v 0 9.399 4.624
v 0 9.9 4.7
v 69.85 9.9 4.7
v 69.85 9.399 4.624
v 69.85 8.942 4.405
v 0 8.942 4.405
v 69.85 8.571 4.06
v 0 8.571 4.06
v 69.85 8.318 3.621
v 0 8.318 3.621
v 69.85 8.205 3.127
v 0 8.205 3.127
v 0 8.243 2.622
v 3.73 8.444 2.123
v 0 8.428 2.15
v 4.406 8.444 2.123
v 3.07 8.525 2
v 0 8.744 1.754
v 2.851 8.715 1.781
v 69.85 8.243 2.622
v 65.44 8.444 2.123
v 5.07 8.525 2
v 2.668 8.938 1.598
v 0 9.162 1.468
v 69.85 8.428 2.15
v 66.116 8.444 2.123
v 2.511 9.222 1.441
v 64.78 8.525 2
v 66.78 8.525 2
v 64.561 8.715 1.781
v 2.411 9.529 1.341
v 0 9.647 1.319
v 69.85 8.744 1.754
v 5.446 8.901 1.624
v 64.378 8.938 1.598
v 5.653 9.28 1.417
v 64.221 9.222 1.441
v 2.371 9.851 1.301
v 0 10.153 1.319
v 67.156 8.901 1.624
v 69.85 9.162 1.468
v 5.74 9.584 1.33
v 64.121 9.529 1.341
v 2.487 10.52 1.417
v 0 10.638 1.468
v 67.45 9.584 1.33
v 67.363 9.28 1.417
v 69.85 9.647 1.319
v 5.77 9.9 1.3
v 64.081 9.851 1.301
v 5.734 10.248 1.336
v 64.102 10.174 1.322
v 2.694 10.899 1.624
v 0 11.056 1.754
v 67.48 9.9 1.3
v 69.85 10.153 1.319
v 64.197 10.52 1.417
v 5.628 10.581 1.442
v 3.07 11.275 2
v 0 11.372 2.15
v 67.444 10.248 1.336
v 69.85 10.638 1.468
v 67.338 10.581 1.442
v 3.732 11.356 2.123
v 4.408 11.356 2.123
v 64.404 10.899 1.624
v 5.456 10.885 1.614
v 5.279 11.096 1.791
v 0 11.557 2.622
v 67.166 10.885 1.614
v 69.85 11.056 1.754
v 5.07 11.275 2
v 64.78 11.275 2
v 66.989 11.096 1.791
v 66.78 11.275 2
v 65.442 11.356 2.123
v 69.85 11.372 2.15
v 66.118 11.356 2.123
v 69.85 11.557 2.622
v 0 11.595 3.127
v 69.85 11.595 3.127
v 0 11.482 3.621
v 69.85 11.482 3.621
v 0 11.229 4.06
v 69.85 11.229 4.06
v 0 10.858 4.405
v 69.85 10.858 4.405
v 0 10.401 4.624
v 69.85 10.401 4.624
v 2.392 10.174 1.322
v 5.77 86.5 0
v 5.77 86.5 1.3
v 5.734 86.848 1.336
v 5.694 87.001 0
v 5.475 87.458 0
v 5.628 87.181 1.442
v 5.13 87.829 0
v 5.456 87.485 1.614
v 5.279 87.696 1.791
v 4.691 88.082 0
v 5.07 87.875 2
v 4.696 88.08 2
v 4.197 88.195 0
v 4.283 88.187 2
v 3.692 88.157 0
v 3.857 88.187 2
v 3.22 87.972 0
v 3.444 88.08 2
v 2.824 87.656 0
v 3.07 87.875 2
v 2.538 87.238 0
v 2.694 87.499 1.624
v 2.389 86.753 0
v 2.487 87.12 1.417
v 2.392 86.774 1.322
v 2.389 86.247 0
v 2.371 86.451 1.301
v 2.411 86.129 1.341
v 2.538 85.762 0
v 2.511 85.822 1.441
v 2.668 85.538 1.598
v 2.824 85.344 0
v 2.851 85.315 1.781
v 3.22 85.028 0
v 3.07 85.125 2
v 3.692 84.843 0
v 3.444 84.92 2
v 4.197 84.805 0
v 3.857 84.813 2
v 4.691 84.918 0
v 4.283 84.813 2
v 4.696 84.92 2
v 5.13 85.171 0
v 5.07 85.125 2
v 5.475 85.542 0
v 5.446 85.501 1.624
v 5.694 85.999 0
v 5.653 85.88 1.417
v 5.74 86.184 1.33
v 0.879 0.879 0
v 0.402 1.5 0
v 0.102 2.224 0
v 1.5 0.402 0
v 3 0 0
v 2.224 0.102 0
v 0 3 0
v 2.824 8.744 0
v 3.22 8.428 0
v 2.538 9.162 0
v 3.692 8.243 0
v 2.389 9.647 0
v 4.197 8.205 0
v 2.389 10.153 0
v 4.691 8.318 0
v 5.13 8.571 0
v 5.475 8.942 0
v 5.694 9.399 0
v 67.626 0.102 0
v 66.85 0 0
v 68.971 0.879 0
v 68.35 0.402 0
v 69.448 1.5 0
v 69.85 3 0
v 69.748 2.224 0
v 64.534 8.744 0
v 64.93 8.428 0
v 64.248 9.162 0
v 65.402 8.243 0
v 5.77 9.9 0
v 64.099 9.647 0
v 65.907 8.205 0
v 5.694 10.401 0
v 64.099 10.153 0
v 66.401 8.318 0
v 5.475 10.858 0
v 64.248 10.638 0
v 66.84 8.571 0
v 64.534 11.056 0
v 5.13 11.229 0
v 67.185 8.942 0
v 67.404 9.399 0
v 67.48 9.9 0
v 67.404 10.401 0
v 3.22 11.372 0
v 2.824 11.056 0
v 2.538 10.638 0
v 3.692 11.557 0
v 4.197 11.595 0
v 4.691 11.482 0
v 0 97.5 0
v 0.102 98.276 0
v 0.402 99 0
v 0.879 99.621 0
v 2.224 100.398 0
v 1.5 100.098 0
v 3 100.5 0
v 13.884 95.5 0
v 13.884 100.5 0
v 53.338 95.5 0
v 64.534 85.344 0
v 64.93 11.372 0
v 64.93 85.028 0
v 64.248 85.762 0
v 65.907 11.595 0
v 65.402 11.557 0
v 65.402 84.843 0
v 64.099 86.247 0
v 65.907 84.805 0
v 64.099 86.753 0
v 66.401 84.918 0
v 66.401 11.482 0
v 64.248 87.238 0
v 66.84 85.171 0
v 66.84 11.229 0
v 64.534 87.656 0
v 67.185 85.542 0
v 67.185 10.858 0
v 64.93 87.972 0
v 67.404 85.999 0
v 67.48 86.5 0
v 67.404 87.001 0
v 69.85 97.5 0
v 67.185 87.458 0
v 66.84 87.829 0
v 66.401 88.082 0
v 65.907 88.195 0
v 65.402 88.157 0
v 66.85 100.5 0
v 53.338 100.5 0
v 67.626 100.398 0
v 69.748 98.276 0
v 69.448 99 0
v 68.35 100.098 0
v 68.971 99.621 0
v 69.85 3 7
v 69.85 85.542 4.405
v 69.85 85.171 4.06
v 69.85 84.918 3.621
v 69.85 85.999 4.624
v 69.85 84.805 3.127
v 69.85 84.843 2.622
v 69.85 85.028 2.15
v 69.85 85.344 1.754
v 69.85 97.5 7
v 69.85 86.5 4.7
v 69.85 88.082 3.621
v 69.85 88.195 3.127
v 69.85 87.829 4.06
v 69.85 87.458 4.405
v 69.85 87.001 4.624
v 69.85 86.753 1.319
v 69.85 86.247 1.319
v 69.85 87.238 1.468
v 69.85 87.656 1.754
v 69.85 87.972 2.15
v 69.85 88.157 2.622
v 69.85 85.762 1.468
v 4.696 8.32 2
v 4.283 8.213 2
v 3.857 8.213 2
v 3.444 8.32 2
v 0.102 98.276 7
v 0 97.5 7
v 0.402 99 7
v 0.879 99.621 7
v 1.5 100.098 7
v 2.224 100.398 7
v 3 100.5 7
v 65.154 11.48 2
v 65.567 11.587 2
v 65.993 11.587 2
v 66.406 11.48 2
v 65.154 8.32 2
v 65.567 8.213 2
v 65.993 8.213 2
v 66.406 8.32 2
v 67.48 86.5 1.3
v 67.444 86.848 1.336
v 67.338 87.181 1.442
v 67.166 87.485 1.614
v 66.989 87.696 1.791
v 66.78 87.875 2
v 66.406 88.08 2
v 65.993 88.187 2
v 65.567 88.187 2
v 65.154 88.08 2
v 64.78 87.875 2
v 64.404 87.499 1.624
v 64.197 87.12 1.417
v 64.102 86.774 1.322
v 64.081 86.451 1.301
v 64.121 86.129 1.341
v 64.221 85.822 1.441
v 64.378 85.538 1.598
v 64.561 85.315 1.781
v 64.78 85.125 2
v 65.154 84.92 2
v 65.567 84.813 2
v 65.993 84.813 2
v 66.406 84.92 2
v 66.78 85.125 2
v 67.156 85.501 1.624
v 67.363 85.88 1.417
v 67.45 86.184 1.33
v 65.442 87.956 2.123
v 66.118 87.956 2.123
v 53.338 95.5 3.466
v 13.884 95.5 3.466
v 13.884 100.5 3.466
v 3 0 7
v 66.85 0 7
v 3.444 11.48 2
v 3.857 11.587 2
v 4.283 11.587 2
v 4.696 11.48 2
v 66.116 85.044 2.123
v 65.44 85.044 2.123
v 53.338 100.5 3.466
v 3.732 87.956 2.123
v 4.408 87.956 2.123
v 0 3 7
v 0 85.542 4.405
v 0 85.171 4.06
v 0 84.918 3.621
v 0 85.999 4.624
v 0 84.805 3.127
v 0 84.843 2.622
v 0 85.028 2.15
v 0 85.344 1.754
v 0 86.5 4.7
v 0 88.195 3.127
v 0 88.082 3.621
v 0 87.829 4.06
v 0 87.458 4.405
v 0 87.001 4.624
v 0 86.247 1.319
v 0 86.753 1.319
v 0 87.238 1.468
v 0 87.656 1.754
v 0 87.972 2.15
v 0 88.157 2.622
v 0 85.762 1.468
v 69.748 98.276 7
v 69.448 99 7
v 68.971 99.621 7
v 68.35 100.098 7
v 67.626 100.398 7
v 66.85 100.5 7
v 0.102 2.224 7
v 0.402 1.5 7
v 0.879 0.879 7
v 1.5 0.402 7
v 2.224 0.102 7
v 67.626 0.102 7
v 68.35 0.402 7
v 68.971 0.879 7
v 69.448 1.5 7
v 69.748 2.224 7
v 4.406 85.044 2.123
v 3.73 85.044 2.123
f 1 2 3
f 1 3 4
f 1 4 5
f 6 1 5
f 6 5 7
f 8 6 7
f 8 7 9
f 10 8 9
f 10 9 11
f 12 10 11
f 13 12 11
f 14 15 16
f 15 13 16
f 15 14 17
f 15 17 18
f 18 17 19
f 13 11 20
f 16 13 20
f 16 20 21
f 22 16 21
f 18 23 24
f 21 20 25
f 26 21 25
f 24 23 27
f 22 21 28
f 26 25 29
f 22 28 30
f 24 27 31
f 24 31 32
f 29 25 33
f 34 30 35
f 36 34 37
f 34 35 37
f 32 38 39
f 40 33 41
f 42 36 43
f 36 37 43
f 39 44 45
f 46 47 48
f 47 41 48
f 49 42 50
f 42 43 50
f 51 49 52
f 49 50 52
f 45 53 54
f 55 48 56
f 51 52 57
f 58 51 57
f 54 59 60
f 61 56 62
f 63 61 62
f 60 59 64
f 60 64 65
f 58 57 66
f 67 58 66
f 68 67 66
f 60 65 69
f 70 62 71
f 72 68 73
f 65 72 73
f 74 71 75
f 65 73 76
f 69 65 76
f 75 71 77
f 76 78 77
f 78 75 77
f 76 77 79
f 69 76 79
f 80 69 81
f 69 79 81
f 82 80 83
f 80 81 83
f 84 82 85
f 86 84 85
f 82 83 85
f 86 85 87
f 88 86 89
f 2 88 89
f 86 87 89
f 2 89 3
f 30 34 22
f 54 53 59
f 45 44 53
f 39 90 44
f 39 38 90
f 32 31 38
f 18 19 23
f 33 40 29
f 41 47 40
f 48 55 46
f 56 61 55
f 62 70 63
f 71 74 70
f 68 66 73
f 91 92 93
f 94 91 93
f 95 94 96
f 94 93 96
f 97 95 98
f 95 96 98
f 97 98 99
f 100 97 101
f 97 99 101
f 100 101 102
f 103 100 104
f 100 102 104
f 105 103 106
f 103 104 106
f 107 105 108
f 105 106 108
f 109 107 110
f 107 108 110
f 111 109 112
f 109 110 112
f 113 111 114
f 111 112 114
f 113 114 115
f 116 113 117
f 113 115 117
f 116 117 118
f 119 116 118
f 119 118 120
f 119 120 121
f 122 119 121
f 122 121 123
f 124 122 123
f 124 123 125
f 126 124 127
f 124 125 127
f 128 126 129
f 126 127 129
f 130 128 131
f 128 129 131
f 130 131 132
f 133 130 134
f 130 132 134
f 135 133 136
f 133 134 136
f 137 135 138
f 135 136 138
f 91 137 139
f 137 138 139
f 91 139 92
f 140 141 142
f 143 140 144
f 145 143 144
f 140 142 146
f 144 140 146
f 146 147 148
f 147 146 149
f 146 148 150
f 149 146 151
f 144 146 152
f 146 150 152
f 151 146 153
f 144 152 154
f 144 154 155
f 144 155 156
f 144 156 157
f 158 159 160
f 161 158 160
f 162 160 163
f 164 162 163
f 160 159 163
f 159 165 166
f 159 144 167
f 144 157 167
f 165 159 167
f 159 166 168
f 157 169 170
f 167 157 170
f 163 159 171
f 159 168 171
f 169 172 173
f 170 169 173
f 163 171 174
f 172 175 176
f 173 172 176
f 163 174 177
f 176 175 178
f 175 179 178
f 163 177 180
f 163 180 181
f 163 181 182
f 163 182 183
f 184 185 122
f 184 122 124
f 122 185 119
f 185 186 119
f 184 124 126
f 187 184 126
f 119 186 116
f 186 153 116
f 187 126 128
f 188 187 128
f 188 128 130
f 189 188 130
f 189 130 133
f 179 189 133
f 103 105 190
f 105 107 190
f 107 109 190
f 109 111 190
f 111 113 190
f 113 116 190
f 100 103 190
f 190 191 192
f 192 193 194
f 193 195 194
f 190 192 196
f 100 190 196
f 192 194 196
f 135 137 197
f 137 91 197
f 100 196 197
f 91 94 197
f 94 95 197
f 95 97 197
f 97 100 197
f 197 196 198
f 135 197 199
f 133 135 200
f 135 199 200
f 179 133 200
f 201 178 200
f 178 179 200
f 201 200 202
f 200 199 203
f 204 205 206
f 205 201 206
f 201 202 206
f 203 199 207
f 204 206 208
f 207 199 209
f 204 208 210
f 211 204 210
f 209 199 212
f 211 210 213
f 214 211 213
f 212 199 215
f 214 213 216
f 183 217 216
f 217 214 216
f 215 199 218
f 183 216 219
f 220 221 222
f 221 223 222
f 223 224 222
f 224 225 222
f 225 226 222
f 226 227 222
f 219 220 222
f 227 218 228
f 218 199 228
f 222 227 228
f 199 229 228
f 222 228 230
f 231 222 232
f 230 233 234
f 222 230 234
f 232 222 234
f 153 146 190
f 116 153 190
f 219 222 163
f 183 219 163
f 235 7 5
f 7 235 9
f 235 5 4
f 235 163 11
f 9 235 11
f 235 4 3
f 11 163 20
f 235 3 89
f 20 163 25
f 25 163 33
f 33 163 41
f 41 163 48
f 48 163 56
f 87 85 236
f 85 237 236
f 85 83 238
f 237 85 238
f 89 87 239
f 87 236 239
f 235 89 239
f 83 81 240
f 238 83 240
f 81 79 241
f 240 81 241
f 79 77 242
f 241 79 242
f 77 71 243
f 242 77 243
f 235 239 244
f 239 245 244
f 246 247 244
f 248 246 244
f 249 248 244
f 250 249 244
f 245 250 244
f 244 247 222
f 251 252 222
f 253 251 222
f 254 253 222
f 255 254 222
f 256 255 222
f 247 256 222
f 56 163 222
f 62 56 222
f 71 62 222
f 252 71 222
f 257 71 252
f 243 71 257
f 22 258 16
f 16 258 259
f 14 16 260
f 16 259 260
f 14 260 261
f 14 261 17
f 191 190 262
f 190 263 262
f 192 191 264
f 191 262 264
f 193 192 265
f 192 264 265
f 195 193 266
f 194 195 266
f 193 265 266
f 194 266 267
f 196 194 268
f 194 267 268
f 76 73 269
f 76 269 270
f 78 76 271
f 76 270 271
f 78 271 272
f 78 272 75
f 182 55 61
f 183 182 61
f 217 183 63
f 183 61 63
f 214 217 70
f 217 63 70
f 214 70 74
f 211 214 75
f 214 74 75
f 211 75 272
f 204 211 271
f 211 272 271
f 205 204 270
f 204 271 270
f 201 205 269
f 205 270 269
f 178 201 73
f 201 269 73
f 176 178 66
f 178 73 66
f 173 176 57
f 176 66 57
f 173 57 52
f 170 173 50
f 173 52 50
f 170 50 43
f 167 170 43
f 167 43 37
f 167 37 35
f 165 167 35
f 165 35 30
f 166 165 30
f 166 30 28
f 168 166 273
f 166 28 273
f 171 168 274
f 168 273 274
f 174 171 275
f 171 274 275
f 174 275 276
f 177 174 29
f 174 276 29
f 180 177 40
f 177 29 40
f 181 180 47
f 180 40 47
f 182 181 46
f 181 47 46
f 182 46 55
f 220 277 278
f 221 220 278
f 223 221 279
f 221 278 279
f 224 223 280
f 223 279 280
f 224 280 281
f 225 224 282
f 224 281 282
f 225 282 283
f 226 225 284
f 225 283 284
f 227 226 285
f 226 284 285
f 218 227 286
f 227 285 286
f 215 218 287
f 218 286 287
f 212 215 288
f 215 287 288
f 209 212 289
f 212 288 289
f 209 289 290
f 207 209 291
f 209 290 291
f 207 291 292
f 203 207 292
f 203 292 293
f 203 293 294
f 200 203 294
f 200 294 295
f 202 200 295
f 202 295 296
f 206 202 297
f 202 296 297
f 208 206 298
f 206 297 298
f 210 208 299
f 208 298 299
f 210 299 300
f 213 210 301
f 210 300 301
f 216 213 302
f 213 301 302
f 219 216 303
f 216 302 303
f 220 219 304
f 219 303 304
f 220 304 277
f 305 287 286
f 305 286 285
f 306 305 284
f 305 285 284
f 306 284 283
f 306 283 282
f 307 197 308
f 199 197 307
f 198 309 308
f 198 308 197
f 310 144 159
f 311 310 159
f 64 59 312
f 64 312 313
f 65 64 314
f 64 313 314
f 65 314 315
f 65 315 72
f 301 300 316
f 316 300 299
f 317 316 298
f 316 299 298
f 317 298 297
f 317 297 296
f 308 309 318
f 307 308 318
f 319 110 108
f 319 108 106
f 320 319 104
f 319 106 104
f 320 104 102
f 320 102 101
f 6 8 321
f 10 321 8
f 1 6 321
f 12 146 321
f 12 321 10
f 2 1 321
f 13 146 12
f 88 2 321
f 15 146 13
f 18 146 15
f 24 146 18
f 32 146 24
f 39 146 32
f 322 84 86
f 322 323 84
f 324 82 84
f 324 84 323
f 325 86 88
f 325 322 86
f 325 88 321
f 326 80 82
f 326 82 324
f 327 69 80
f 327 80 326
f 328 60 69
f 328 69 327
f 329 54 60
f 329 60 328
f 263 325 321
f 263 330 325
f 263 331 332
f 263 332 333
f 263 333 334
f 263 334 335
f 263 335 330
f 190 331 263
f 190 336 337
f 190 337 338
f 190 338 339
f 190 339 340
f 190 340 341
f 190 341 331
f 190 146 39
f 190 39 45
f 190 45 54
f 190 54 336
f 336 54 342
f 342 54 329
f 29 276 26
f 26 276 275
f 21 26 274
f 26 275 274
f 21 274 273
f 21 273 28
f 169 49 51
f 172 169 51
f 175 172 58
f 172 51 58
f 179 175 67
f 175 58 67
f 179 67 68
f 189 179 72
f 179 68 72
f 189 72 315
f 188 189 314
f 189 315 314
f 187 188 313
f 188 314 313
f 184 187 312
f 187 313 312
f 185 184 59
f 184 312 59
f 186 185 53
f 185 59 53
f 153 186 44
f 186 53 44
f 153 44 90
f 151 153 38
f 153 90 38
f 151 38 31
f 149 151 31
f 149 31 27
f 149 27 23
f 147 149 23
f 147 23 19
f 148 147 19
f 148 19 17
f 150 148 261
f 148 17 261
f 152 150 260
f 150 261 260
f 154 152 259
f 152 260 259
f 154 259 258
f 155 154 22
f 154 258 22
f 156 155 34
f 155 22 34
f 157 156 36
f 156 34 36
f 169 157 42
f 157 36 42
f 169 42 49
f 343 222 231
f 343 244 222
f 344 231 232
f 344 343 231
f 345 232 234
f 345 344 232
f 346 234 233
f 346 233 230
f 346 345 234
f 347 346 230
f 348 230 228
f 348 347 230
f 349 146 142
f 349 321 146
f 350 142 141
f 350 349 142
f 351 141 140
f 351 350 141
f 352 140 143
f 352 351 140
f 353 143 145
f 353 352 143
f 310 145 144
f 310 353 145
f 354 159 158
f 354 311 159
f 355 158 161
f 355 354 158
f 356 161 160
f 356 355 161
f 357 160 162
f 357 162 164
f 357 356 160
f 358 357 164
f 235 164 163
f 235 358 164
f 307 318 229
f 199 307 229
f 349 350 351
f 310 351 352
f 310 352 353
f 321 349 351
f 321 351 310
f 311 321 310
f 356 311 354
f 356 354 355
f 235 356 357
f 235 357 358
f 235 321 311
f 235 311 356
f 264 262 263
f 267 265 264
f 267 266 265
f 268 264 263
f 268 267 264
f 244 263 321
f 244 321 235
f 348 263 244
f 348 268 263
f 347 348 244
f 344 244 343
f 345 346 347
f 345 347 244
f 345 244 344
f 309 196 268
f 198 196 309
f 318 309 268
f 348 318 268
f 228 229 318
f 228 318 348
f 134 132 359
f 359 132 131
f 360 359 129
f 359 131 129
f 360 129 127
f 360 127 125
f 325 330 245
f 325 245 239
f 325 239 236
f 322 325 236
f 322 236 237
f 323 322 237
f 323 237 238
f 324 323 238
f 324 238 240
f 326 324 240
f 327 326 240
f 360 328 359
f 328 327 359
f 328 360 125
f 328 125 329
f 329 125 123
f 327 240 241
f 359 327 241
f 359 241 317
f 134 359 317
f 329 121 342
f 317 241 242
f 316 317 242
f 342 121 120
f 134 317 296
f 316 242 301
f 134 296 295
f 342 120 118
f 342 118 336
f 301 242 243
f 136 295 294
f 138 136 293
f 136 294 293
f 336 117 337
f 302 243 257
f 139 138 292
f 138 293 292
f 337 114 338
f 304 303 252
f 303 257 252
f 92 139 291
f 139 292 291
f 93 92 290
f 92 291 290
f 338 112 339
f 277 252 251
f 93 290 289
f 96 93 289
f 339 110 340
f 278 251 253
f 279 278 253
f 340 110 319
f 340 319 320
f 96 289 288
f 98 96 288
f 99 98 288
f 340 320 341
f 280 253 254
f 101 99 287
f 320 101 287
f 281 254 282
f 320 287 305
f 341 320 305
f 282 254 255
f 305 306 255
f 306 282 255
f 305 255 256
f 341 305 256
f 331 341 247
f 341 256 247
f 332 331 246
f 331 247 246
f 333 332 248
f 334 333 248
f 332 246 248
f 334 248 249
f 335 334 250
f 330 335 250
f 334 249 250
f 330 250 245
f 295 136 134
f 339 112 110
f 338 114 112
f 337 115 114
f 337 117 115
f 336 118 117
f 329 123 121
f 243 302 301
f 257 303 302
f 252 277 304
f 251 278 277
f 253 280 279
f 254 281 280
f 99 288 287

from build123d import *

# Parameters (mm, degrees)
SKETCH1_W                = 69.85
SKETCH1_H                = 100.5
BOSS_EXTRUDE1_DEPTH      = 7
FILLET1_R                = 3
M3_CLEARANCE_HOLE1_D     = 3.4
M3_CLEARANCE_HOLE1_DEPTH = 2
M3_CLEARANCE_HOLE1_TIP   = 1.021463052
M3_CLEARANCE_HOLE2_D     = 3.4
SKETCH6_W                = 39.454447737
SKETCH6_H                = 3.466414688
CUT_EXTRUDE1_DEPTH       = 5


with BuildPart() as part:
    # Sketch1 → Boss-Extrude1 (new body)
    with BuildSketch(Plane.XY):
        with Locations((34.925, 50.25)):
            Rectangle(SKETCH1_W, SKETCH1_H)
    extrude(amount=BOSS_EXTRUDE1_DEPTH)

    # Fillet1
    fillet1_edges = [part.edges().sort_by_distance(p)[0] for p in [
        (0, 100.5, 3.5),
        (69.85, 100.5, 3.5),
        (69.85, 0, 3.5),
        (0, 0, 3.5),
    ]]
    fillet(fillet1_edges, radius=FILLET1_R)

    # M3 Clearance Hole1
    with Locations(Plane(origin=(4.07, 86.5, 0), x_dir=(-1, 0, 0), z_dir=(0, 0, -1))):
        with Locations((0, 0), (-61.71, 0), (-61.71, -76.6), (0, -76.6)):
            Hole(M3_CLEARANCE_HOLE1_D / 2, depth=M3_CLEARANCE_HOLE1_DEPTH)
            with Locations((0, 0, -(M3_CLEARANCE_HOLE1_DEPTH + M3_CLEARANCE_HOLE1_TIP / 2))):  # 118° drill point
                Cone(0, M3_CLEARANCE_HOLE1_D / 2, M3_CLEARANCE_HOLE1_TIP, mode=Mode.SUBTRACT)

    # M3 Clearance Hole2 (through all)
    with Locations(Plane(origin=(0, 86.5, 3), x_dir=(0, 0, -1), z_dir=(-1, 0, 0))):
        with Locations((0, 0), (0, 76.6)):
            Hole(M3_CLEARANCE_HOLE2_D / 2)

    # Sketch6 → Cut-Extrude1 (cut)
    with BuildSketch(Plane(origin=(0, 100.5, 0), x_dir=(1, 0, 0), z_dir=(0, 1, 0))):
        with Locations((33.611063607, -1.733207344)):
            Rectangle(SKETCH6_W, SKETCH6_H)
    extrude(amount=-CUT_EXTRUDE1_DEPTH, mode=Mode.SUBTRACT)


solid = part.part
